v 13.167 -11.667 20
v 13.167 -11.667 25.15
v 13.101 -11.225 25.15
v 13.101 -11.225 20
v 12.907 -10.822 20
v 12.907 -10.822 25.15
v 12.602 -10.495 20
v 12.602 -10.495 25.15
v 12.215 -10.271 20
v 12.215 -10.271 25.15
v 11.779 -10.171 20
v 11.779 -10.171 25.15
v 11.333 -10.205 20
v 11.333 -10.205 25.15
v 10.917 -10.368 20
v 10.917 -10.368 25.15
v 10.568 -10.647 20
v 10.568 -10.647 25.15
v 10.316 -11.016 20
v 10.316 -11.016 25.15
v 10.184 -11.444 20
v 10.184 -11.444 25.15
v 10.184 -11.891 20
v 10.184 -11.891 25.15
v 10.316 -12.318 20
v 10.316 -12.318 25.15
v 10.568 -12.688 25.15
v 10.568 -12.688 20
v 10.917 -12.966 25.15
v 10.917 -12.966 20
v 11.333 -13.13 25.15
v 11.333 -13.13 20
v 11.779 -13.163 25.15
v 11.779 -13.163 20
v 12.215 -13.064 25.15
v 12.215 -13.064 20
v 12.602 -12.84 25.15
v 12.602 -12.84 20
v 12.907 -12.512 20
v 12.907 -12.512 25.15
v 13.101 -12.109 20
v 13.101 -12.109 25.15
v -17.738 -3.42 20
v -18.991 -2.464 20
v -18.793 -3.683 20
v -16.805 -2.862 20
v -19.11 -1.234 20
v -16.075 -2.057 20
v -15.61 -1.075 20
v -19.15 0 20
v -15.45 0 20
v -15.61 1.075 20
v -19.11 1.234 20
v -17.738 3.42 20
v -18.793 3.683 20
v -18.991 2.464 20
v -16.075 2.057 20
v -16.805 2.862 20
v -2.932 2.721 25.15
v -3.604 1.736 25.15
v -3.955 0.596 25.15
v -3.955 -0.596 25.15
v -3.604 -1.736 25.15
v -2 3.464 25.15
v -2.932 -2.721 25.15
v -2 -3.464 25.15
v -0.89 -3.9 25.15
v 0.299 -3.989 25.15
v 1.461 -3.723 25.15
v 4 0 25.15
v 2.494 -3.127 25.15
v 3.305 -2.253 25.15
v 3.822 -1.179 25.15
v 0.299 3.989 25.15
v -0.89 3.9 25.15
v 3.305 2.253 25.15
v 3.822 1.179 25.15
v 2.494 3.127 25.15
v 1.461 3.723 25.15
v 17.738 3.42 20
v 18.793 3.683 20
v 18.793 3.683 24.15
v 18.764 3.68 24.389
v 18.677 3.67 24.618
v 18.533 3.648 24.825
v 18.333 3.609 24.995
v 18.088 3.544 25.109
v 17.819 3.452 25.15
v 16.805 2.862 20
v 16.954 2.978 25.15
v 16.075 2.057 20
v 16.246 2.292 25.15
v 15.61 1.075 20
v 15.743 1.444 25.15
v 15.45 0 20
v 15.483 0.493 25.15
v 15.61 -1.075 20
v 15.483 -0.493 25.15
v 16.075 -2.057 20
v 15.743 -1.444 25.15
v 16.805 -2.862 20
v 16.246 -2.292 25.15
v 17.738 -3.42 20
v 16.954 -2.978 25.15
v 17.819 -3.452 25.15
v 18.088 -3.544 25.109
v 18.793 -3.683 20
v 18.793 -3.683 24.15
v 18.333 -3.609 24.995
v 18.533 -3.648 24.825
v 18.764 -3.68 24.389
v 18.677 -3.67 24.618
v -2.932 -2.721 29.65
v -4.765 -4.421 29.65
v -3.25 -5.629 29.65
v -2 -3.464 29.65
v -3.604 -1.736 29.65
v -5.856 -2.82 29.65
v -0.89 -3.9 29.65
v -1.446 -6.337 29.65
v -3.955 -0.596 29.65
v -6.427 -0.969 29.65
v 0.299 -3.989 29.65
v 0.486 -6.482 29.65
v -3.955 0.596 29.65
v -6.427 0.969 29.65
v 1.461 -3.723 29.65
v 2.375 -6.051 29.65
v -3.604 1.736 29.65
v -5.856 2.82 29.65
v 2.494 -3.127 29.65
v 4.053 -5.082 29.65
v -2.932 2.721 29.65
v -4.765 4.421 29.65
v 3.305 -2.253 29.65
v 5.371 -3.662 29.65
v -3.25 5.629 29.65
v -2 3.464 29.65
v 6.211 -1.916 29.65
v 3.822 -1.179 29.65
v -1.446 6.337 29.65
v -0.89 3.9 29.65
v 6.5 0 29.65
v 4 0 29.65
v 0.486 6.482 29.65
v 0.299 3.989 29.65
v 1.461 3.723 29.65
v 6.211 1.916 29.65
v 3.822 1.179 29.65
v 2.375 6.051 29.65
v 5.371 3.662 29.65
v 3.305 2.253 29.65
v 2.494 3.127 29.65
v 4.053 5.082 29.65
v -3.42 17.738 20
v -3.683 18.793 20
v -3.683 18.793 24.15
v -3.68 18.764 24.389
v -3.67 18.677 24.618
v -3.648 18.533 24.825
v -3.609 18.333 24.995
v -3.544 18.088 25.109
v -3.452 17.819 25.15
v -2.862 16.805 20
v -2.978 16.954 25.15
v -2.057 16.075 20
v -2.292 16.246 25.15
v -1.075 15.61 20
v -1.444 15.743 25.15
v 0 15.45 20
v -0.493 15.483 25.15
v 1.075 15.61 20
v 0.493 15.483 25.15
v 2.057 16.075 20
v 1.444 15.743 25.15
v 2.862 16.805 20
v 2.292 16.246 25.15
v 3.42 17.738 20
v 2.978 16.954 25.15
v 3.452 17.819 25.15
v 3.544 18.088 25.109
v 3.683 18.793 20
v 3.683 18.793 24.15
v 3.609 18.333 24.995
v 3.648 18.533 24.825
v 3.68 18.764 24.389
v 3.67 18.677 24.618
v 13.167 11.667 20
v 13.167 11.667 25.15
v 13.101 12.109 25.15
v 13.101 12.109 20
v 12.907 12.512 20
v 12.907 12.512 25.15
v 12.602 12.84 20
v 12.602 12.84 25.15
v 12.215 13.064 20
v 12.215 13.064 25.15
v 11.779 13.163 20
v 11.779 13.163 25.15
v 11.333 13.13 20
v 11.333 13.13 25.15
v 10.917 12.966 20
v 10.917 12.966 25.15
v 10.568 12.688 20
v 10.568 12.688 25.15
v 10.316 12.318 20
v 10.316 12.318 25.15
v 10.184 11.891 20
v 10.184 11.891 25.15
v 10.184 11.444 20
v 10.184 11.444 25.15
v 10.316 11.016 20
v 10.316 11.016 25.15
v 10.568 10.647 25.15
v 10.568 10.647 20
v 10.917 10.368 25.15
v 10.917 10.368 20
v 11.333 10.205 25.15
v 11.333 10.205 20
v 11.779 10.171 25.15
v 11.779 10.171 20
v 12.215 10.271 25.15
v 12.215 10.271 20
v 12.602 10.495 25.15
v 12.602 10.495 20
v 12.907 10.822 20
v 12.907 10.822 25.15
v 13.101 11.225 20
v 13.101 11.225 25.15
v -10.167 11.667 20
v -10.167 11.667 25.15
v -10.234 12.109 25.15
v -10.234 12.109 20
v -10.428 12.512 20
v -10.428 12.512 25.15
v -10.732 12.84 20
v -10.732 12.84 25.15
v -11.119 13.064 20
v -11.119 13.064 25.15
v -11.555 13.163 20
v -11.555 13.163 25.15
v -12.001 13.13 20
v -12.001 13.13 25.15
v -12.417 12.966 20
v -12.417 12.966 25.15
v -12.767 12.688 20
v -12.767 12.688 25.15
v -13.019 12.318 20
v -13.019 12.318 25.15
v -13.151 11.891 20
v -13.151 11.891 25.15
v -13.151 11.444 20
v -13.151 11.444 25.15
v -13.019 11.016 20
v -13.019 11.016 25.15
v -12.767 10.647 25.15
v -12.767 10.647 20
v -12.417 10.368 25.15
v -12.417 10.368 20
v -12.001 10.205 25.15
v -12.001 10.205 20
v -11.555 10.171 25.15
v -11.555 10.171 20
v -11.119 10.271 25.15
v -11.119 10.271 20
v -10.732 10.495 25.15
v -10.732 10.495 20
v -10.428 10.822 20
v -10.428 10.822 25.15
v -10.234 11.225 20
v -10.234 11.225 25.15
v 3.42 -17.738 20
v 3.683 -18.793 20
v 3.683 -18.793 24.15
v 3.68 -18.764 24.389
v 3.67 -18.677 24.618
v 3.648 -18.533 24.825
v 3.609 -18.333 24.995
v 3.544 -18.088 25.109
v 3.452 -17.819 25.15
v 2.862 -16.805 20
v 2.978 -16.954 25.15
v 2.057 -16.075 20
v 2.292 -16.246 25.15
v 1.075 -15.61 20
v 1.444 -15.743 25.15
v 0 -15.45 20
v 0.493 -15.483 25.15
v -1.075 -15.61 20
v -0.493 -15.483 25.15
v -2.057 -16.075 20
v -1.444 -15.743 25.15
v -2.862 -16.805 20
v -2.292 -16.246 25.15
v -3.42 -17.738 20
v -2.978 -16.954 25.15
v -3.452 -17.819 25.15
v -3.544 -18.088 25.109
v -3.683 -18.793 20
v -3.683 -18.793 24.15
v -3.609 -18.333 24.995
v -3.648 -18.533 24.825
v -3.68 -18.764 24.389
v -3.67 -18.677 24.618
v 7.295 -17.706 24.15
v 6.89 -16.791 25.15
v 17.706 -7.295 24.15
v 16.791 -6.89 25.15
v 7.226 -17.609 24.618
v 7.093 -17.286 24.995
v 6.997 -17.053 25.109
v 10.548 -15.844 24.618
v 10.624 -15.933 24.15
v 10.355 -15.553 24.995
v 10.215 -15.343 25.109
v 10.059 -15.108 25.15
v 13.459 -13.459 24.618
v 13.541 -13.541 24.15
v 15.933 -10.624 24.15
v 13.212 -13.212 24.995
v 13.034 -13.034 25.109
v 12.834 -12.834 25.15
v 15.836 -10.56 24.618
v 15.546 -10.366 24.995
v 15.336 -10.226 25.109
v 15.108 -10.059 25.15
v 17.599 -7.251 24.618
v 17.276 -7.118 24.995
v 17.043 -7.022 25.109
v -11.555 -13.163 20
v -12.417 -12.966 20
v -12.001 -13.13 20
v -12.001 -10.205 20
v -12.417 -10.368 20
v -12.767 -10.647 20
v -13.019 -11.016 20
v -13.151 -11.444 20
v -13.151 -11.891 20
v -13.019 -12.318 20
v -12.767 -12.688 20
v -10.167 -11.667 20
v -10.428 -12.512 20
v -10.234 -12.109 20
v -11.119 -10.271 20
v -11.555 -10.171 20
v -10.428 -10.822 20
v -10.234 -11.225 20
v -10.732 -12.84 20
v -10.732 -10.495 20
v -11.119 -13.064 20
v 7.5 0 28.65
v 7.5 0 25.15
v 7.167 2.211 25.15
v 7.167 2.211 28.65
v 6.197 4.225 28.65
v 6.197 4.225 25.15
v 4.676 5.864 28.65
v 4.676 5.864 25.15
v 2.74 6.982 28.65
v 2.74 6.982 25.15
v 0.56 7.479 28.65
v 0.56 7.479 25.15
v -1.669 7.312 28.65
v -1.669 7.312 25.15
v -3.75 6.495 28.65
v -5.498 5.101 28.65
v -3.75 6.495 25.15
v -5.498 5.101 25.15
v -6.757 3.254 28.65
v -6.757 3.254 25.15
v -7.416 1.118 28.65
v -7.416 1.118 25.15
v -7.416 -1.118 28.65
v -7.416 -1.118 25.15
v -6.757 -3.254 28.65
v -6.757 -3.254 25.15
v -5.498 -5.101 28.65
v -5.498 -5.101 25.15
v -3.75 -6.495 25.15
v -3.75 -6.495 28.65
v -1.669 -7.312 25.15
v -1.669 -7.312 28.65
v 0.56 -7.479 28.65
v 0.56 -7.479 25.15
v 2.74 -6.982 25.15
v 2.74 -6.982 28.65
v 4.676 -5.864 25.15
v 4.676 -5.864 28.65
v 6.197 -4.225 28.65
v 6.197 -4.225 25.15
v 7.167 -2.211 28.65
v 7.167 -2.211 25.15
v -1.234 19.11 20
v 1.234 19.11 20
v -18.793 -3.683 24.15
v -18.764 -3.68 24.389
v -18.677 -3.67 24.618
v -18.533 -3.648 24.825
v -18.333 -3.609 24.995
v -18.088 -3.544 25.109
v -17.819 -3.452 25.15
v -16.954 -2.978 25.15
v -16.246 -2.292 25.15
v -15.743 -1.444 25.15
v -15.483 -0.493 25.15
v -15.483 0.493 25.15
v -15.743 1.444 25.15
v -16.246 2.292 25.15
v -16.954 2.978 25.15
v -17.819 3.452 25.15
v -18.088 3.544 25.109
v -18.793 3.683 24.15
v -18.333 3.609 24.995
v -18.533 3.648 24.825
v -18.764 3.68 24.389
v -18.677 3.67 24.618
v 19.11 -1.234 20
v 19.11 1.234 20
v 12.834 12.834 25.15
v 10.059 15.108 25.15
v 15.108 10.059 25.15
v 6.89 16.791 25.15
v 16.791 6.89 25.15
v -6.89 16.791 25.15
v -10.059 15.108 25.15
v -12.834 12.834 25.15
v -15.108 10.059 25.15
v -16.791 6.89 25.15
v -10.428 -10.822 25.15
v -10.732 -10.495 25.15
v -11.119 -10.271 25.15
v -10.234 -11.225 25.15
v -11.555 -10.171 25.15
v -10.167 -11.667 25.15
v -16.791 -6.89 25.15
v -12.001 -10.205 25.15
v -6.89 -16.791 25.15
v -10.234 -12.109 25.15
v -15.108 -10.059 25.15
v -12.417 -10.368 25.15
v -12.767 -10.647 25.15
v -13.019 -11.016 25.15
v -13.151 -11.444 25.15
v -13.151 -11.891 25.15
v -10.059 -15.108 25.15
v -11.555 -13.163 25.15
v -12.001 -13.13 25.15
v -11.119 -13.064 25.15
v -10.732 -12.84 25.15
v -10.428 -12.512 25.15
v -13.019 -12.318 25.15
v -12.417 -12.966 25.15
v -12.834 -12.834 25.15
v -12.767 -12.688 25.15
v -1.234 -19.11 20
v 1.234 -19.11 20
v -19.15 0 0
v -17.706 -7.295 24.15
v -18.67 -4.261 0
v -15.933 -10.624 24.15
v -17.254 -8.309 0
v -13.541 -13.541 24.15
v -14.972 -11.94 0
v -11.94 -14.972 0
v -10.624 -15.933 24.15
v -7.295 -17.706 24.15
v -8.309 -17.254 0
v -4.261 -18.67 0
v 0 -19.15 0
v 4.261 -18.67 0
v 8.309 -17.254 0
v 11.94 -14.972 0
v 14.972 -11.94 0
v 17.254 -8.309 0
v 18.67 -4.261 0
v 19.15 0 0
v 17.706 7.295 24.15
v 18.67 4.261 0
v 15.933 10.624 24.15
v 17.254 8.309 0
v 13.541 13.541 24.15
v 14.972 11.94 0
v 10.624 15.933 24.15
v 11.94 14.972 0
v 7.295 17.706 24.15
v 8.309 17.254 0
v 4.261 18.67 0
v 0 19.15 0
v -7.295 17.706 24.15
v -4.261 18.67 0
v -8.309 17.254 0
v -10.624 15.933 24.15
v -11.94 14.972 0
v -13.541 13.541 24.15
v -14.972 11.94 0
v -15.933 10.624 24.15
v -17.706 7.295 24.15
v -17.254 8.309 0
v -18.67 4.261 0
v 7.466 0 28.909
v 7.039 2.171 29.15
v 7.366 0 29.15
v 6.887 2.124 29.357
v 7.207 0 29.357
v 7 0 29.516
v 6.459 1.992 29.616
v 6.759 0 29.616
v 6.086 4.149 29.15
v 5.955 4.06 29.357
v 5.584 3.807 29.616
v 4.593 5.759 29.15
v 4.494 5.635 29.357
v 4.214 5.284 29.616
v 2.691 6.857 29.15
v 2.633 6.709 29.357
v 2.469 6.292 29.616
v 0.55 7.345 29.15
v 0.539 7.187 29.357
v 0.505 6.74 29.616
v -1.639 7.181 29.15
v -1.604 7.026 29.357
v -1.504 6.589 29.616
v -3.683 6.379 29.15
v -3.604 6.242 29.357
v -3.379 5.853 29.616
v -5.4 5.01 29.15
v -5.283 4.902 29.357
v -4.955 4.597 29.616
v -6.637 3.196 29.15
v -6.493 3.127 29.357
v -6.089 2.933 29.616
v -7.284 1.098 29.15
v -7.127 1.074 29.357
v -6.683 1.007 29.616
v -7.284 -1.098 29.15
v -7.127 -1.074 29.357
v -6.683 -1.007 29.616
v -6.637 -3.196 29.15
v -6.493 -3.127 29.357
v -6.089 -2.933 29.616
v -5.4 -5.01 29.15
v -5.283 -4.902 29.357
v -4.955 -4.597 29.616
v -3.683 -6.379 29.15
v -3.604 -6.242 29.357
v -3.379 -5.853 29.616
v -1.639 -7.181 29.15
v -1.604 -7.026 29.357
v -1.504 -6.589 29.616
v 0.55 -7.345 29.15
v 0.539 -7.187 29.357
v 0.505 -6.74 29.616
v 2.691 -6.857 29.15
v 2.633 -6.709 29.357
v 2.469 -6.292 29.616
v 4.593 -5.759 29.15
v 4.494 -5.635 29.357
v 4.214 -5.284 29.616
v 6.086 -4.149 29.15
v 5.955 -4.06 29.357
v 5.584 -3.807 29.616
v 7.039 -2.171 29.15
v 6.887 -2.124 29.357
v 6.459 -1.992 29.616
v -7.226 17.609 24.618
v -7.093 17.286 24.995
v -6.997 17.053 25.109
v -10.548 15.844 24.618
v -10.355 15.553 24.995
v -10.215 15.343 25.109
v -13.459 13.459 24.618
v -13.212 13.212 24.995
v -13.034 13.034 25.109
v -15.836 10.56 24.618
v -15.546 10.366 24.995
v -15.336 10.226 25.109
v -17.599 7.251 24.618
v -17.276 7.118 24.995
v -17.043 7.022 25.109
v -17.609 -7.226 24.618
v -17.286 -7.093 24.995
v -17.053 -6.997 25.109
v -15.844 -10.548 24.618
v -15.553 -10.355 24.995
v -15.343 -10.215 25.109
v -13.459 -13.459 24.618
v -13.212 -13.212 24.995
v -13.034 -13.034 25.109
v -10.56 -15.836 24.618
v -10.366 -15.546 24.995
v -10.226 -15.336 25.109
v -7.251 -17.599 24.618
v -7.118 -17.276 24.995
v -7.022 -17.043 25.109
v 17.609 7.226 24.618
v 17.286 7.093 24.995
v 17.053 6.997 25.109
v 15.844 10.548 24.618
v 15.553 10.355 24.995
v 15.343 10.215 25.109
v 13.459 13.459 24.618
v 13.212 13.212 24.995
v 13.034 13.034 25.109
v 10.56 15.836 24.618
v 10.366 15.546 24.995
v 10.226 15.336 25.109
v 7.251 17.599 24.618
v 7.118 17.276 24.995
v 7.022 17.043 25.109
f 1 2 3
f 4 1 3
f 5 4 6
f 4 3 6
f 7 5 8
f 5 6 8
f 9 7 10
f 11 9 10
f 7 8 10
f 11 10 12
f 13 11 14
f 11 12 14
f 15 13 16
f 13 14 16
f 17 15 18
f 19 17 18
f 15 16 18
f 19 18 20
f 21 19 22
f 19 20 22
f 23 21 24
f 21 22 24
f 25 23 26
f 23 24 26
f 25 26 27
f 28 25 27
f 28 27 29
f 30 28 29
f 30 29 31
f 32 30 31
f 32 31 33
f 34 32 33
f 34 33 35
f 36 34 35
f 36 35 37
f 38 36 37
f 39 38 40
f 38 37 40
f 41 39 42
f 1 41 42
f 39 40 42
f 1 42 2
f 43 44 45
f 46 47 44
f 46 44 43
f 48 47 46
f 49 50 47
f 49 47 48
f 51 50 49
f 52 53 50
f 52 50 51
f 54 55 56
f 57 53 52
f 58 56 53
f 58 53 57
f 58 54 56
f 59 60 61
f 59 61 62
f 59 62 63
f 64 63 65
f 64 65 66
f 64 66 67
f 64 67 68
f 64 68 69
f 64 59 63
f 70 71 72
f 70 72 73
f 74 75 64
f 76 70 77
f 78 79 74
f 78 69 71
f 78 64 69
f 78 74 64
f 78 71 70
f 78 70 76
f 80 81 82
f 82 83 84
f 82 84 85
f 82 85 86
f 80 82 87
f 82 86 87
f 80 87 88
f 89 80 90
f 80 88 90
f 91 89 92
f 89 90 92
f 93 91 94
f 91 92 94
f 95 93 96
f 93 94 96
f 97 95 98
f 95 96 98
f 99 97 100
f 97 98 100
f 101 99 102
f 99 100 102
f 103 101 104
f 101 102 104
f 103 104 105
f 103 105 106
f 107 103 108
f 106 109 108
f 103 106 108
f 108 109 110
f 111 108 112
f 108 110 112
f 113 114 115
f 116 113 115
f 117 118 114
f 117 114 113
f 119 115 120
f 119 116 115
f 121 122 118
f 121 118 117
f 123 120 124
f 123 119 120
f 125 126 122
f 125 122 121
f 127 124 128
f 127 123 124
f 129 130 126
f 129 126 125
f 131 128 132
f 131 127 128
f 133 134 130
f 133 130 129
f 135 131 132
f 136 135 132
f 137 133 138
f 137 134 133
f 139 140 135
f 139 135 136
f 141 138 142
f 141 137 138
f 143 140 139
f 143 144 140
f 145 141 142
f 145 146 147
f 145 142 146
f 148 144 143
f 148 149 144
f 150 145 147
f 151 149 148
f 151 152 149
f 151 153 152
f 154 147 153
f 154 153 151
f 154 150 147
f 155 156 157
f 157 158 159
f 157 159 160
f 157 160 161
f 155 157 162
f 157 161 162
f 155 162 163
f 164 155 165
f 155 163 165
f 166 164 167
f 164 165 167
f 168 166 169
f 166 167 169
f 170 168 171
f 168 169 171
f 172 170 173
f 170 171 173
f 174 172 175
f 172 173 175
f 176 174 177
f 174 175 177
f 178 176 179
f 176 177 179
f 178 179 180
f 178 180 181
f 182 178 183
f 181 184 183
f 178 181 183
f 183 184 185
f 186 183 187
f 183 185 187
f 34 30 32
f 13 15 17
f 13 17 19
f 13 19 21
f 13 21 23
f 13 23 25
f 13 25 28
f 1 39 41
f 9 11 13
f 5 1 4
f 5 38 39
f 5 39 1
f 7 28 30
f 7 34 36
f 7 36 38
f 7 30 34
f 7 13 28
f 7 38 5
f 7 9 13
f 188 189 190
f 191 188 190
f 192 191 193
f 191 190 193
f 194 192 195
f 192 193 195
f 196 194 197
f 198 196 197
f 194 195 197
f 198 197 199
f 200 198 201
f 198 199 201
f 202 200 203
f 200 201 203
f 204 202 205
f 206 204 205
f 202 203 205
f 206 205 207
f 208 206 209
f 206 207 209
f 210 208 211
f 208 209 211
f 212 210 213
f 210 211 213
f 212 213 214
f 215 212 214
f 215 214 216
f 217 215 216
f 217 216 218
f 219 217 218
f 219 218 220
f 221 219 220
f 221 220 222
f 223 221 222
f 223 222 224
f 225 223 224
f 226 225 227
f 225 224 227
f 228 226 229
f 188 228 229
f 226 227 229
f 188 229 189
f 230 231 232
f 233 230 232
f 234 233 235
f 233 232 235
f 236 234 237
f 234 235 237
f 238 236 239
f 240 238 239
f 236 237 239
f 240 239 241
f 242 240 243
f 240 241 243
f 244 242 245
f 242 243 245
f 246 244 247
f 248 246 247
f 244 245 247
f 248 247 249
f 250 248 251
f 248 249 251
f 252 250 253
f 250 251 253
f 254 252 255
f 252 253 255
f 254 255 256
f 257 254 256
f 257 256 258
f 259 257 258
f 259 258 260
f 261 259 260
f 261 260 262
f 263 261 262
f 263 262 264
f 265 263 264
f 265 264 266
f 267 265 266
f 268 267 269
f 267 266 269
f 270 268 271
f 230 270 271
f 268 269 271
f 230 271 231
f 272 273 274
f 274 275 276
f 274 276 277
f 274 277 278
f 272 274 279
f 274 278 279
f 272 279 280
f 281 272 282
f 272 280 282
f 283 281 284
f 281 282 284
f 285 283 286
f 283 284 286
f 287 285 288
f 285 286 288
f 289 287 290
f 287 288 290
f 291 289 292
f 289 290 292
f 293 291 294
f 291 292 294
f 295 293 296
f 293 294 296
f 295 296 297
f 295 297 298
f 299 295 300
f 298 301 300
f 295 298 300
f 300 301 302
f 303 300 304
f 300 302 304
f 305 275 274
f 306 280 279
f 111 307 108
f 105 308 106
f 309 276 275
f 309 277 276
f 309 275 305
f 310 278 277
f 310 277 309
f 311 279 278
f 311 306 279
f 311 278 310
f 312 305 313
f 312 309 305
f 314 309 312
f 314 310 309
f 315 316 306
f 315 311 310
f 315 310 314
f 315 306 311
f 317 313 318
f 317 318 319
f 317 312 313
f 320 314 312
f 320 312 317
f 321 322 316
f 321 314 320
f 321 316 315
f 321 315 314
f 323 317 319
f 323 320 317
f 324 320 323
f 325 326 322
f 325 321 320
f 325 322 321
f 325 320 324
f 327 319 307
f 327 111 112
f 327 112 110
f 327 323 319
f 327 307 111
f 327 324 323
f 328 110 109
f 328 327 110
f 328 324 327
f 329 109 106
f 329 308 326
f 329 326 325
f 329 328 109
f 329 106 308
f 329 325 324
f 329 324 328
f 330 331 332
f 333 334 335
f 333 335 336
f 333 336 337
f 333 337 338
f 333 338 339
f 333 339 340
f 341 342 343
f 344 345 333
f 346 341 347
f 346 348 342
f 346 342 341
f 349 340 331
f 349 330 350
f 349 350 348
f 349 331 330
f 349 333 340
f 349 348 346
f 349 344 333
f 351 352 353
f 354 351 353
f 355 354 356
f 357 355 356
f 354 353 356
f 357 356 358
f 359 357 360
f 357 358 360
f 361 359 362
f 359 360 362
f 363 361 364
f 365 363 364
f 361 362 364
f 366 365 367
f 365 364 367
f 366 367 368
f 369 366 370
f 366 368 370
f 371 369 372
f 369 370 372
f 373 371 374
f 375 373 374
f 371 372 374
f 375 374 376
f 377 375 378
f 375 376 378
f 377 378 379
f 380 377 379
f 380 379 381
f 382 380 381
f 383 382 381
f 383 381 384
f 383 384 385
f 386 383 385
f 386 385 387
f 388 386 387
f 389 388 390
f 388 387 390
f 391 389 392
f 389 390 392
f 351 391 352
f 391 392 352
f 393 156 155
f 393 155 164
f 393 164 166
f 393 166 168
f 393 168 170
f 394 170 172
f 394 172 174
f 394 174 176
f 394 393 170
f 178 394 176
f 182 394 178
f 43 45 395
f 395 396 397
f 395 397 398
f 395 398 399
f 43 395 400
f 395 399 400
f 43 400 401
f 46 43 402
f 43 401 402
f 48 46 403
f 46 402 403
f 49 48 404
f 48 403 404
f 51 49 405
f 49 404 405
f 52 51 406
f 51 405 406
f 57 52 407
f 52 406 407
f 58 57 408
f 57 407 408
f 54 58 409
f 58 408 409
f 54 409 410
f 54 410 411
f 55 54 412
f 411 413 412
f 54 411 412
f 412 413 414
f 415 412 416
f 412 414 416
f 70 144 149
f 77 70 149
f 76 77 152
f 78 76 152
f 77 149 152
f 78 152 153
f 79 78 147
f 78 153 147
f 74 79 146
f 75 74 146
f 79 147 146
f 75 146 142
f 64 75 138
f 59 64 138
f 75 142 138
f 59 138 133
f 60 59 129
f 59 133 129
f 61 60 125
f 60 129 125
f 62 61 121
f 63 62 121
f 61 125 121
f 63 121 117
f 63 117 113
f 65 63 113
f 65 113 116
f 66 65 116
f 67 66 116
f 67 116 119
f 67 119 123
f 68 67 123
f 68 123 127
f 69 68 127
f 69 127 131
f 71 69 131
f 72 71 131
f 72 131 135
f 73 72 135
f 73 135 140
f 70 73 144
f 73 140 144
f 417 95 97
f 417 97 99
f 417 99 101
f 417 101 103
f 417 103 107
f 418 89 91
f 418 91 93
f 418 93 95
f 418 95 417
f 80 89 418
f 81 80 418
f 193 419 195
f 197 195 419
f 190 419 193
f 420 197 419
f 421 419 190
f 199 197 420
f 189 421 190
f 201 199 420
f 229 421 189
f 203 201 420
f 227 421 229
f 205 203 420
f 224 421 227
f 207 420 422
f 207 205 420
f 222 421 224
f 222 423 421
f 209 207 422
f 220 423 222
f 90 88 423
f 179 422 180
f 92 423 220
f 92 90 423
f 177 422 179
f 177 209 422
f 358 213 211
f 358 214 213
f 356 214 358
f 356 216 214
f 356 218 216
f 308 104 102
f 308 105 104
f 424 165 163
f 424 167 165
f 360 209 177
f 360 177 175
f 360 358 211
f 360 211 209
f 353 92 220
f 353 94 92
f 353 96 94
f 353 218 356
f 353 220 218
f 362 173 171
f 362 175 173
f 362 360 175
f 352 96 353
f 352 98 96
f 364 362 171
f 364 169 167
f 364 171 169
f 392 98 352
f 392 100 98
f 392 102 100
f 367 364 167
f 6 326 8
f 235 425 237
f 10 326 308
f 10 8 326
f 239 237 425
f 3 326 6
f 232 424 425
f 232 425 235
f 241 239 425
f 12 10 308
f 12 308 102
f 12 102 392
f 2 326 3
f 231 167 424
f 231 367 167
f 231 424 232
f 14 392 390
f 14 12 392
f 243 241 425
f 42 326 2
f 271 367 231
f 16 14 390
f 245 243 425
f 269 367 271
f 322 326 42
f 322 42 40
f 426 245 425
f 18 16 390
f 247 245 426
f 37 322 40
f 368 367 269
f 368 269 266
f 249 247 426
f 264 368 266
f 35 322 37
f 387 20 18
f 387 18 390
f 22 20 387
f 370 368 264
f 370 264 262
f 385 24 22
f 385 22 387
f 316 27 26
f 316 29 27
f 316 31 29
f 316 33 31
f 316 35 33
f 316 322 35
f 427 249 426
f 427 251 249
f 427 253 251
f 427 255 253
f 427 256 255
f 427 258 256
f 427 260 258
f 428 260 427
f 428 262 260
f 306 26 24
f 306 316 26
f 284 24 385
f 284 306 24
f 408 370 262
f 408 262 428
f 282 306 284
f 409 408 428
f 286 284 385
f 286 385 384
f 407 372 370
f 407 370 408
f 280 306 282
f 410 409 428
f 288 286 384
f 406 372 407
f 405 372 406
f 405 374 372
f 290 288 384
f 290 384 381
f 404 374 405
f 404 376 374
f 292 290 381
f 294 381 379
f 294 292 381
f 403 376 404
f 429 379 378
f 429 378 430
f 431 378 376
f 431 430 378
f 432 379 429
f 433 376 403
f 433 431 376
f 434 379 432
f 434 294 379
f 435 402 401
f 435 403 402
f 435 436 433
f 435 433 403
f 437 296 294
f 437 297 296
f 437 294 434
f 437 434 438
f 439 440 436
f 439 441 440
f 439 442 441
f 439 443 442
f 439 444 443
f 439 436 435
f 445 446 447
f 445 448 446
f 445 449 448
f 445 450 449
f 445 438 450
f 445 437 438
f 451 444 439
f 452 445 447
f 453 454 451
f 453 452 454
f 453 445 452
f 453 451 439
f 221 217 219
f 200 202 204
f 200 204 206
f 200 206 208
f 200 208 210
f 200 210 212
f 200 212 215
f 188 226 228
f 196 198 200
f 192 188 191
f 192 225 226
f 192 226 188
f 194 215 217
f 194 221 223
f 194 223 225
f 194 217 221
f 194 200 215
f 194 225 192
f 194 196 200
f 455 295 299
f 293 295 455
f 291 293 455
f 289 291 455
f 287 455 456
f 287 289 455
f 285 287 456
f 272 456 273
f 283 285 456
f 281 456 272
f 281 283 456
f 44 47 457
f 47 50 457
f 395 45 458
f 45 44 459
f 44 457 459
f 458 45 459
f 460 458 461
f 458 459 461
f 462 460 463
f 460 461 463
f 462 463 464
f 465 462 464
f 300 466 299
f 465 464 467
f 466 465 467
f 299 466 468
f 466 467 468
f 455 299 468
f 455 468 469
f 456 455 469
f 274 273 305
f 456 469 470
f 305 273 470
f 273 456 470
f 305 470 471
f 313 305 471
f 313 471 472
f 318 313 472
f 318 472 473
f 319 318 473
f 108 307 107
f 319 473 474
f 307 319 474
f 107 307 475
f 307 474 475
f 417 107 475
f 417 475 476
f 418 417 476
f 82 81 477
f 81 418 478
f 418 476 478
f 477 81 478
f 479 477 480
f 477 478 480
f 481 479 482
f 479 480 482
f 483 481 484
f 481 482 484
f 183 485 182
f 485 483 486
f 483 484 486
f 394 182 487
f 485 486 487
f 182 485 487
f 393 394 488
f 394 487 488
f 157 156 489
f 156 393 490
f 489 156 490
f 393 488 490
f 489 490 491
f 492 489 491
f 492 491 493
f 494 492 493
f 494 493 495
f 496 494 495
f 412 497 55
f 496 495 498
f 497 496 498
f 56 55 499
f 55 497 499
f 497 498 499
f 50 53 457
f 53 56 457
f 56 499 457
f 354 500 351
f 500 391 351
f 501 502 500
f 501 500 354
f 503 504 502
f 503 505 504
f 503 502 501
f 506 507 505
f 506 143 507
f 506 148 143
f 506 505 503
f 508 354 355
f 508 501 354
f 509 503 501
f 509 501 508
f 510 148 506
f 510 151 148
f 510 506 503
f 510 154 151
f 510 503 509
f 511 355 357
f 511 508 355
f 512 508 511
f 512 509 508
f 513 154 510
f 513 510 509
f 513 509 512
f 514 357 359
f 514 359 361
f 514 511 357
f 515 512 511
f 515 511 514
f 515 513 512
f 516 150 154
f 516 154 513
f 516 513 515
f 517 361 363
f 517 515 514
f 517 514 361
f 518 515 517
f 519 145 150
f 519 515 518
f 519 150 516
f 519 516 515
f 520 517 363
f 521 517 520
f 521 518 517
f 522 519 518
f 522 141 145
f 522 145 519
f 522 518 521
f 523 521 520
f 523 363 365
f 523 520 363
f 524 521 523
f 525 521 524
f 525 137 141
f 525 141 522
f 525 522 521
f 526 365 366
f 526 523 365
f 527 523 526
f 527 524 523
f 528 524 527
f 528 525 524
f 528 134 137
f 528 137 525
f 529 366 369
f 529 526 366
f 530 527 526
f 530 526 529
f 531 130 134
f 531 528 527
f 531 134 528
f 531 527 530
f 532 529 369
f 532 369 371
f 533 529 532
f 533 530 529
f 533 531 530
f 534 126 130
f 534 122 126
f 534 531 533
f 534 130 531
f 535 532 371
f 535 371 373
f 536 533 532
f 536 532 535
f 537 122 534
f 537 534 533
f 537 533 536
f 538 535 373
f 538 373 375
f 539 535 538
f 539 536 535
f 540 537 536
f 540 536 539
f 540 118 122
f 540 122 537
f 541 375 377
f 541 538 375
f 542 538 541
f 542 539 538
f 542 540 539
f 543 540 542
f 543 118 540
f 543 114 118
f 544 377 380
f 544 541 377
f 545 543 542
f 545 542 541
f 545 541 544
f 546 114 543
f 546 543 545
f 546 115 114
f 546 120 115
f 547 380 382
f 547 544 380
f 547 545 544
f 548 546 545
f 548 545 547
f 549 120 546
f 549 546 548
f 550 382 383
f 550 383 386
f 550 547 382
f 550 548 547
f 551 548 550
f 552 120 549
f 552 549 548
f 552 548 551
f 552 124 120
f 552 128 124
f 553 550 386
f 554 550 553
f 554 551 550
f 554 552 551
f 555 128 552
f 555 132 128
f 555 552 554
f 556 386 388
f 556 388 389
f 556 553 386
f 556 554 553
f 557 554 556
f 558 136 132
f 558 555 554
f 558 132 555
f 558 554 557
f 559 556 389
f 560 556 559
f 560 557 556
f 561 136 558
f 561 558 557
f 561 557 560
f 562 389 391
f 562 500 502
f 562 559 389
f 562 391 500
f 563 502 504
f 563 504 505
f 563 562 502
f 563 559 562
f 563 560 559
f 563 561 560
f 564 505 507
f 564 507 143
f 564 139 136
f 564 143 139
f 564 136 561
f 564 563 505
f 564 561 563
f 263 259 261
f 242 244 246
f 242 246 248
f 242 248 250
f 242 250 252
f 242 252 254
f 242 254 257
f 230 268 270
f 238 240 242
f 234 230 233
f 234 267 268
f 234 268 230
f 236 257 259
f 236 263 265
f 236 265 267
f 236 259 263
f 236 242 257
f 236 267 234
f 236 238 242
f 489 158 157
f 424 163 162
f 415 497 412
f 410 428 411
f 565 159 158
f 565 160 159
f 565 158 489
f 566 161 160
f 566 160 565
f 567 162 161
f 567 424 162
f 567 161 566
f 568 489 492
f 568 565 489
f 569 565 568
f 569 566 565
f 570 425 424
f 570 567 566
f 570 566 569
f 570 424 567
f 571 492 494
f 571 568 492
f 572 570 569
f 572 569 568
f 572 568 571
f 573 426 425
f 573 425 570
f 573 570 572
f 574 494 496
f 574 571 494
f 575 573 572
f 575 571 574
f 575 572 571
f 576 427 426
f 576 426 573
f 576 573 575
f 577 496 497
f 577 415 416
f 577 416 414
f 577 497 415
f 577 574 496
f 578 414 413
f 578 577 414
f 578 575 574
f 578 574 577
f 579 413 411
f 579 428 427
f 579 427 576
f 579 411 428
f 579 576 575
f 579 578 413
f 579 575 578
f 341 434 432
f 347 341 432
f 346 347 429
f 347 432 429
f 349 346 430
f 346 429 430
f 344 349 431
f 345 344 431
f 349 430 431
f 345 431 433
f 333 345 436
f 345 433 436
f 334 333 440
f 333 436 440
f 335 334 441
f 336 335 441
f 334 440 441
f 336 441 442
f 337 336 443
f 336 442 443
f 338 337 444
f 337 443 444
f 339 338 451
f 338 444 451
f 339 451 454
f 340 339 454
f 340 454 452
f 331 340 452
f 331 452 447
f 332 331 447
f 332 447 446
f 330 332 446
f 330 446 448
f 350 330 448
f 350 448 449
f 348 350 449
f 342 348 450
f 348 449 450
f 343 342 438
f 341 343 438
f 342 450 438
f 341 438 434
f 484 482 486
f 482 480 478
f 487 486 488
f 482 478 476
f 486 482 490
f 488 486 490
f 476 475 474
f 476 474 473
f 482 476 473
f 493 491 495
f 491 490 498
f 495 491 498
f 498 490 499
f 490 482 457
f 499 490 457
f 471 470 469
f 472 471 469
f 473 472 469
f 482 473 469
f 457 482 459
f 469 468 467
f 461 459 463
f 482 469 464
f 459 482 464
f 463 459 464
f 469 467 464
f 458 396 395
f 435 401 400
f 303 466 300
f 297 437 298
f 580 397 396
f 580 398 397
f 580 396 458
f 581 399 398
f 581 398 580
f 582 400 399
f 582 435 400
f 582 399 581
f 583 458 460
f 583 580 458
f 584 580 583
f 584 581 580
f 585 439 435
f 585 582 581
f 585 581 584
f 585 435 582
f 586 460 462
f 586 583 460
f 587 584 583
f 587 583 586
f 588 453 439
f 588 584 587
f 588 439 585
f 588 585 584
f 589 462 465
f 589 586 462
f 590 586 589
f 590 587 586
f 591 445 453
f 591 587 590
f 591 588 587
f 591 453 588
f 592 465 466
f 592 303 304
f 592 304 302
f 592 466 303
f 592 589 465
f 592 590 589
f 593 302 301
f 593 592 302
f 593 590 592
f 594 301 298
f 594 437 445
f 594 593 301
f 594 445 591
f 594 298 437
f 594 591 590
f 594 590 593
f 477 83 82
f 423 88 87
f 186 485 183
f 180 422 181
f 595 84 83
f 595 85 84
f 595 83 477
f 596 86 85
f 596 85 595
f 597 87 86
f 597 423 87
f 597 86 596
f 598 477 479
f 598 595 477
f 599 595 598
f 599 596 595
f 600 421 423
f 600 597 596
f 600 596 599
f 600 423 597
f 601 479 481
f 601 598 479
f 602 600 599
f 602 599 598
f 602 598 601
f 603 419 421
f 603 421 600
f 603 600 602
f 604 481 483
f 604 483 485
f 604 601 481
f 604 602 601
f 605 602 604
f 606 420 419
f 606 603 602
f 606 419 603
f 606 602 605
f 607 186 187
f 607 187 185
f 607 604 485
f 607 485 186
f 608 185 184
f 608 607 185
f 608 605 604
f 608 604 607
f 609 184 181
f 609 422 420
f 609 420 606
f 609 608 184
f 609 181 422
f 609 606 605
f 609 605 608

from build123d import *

# Parameters (mm, degrees)
SKETCH2_R           = 19.15
BOSS_EXTRUDE1_DEPTH = 25.15
SKETCH3_R           = 1.5
SKETCH3_R_2         = 3.7
CUT_EXTRUDE1_DEPTH  = 5.15
SKETCH4_R           = 7.5
BOSS_EXTRUDE2_DEPTH = 4.5
SKETCH5_R           = 4
CUT_EXTRUDE2_DEPTH  = 4.5
FILLET1_R           = 1


with BuildPart() as part:
    # Sketch2 → Boss-Extrude1 (new body)
    with BuildSketch(Plane.XY):
        with Locations(Location((0, 0, 0), (0, 0, 180))):
            Circle(SKETCH2_R)
    extrude(amount=BOSS_EXTRUDE1_DEPTH)

    # Sketch3 → Cut-Extrude1 (cut)
    with BuildSketch(Plane.XY.offset(25.15)):
        with Locations((11.66726189, 11.66726189)):
            Circle(SKETCH3_R)
        with Locations((-11.66726189, -11.66726189)):
            Circle(SKETCH3_R)
        with Locations((11.66726189, -11.66726189)):
            Circle(SKETCH3_R)
        with Locations((-11.66726189, 11.66726189)):
            Circle(SKETCH3_R)
        with Locations((0, 19.15)):
            Circle(SKETCH3_R_2)
        with Locations((0, -19.15)):
            Circle(SKETCH3_R_2)
        with Locations((-19.15, 0)):
            Circle(SKETCH3_R_2)
        with Locations((19.15, 0)):
            Circle(SKETCH3_R_2)
    extrude(amount=-CUT_EXTRUDE1_DEPTH, mode=Mode.SUBTRACT)

    # Sketch4 → Boss-Extrude2 (add)
    with BuildSketch(Plane.XY.offset(25.15)):
        Circle(SKETCH4_R)
    extrude(amount=BOSS_EXTRUDE2_DEPTH)

    # Sketch5 → Cut-Extrude2 (cut)
    with BuildSketch(Plane.XY.offset(29.65)):
        Circle(SKETCH5_R)
    extrude(amount=-CUT_EXTRUDE2_DEPTH, mode=Mode.SUBTRACT)

    # Fillet1
    fillet1_edges = [part.edges().sort_by_distance(p)[0] for p in [
        (13.54109486, 13.54109486, 25.15),
        (-7.5, 0, 29.65),
        (-13.54109486, 13.54109486, 25.15),
        (-13.54109486, -13.54109486, 25.15),
        (13.54109486, -13.54109486, 25.15),
    ]]
    fillet(fillet1_edges, radius=FILLET1_R)


solid = part.part
